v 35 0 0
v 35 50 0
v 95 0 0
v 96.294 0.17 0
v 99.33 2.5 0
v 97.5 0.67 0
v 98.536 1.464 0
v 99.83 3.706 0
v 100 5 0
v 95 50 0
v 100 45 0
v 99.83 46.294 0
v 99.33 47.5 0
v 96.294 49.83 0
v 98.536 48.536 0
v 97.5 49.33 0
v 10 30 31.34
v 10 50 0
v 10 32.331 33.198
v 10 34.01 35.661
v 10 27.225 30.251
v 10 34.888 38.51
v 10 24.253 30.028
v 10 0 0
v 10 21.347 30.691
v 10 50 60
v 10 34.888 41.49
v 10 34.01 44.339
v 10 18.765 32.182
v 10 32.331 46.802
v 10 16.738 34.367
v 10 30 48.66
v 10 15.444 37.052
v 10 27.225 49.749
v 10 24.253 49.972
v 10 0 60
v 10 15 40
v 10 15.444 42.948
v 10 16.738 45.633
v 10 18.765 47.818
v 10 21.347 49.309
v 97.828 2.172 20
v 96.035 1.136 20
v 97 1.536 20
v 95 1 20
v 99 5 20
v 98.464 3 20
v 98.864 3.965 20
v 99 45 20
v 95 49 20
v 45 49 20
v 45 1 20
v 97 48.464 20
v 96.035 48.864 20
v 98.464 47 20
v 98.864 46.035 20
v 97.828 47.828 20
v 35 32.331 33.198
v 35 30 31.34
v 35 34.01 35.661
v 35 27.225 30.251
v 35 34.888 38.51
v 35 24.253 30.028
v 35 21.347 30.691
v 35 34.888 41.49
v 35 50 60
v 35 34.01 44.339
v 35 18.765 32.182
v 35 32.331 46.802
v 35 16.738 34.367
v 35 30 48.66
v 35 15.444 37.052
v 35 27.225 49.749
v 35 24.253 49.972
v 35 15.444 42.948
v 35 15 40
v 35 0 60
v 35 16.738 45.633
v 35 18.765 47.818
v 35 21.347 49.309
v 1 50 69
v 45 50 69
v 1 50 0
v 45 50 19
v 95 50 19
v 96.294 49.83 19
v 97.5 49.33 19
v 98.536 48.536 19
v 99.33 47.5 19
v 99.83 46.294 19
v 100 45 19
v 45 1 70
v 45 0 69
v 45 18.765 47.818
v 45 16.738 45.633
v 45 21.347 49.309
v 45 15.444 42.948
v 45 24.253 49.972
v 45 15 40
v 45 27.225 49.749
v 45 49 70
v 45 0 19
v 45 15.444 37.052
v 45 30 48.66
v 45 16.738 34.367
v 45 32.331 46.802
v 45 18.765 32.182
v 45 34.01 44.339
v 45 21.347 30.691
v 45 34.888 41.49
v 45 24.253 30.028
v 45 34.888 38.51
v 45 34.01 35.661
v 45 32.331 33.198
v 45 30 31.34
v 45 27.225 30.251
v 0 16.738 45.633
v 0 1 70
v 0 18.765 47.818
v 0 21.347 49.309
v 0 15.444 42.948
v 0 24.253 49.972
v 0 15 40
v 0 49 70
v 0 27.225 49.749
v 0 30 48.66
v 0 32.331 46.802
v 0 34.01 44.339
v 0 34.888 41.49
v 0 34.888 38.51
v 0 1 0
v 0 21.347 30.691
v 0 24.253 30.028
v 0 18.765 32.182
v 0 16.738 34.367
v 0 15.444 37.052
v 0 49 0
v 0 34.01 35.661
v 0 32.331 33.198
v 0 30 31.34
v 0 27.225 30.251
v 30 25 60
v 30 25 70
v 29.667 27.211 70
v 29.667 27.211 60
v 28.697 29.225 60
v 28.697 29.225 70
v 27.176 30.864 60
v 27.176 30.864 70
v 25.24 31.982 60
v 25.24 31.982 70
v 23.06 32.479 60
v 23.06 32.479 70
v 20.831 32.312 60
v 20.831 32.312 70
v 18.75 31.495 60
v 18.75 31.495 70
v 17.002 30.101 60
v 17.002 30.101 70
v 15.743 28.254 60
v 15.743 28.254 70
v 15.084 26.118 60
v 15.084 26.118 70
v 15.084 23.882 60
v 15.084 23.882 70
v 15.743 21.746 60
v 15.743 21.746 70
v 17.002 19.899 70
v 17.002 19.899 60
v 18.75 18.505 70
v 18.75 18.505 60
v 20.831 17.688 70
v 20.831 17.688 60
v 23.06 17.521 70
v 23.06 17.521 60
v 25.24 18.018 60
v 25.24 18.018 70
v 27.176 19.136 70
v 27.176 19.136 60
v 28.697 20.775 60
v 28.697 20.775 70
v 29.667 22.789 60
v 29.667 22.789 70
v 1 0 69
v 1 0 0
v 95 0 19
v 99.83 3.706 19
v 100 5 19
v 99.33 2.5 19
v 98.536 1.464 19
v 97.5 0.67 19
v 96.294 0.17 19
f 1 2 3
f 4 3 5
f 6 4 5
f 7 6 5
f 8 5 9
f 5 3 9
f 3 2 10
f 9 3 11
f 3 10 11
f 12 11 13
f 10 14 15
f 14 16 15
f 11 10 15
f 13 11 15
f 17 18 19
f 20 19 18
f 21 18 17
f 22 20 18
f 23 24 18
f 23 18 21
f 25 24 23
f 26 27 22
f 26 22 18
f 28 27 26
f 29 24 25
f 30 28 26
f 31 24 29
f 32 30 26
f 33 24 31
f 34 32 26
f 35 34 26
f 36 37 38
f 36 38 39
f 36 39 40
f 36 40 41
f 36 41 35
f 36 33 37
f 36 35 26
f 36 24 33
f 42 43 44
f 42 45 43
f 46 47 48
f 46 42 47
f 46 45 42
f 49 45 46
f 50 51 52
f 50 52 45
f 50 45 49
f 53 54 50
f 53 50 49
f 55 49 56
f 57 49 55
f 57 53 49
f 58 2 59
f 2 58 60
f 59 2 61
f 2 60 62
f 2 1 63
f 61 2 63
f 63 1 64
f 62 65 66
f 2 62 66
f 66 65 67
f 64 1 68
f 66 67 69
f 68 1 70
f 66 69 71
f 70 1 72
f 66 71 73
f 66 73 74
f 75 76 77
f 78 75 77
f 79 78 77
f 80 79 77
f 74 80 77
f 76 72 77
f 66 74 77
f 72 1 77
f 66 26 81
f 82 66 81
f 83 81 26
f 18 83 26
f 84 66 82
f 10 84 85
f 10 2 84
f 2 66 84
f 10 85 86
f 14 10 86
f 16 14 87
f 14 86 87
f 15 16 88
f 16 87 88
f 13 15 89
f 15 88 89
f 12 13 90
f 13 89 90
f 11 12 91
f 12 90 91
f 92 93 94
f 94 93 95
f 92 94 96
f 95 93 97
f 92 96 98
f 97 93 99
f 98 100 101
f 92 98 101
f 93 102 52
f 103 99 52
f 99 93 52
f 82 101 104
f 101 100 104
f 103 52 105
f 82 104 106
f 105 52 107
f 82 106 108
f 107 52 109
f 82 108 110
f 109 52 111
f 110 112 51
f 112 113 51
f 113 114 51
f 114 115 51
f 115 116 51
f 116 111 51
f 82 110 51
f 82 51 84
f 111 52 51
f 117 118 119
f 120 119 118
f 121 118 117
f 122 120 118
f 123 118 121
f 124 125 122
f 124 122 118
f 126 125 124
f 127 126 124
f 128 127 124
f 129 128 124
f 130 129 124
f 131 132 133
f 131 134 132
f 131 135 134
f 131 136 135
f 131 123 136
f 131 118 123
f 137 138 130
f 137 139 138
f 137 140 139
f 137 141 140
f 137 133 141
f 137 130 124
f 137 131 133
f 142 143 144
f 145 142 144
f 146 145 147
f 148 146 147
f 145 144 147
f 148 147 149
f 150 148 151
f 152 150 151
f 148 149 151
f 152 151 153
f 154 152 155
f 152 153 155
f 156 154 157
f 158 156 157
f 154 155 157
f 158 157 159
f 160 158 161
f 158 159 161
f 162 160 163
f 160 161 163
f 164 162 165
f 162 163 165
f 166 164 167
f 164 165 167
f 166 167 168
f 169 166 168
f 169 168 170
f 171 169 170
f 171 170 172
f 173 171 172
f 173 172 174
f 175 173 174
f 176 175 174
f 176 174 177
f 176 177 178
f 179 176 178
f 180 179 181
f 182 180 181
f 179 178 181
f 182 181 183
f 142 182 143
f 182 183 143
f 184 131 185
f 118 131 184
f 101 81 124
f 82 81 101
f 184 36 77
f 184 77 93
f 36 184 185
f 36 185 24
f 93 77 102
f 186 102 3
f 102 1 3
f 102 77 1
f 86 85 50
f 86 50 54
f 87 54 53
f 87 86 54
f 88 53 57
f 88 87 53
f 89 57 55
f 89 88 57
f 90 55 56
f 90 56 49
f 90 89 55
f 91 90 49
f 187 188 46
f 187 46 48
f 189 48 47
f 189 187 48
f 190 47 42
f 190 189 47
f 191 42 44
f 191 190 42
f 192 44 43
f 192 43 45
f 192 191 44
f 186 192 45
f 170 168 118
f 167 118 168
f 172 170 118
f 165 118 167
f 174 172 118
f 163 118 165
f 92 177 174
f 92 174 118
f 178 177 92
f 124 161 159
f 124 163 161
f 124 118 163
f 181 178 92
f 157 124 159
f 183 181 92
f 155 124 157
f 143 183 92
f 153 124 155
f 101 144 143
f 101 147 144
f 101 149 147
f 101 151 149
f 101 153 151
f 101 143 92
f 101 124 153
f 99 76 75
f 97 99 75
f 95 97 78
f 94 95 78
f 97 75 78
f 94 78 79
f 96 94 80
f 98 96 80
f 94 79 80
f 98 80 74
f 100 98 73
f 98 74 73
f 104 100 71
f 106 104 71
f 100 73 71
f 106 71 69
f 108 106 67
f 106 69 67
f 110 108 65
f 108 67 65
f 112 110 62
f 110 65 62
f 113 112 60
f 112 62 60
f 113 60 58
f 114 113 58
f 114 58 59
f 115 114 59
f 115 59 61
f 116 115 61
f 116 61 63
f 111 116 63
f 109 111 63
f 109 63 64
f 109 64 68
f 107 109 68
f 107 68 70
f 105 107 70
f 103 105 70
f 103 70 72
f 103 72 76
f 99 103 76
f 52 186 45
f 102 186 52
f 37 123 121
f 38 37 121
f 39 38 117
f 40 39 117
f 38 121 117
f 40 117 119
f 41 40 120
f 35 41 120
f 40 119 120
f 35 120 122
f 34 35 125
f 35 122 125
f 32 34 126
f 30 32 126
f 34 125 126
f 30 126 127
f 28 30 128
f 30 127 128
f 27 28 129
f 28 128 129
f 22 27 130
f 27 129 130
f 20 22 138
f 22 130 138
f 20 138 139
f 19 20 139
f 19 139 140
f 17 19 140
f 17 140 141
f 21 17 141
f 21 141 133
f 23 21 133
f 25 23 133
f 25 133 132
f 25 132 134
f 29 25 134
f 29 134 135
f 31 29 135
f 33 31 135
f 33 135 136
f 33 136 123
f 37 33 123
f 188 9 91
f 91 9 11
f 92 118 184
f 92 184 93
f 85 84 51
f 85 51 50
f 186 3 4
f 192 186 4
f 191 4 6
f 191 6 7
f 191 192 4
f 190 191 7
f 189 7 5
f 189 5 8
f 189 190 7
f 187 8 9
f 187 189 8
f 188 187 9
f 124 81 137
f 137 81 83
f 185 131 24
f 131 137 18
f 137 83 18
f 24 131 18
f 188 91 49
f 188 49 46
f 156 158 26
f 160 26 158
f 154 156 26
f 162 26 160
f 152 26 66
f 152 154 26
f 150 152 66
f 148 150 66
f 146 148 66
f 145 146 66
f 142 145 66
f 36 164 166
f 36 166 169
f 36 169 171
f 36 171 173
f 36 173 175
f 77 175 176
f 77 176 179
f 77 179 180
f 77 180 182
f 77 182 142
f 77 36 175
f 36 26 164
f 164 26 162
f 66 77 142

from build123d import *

# Parameters (mm, degrees)
F0_W     = 100
F0_H     = 50
F1_DEPTH = 20
F2_W     = 45
F2_H     = 50
F3_DEPTH = 50
F4_W     = 25
F4_H     = 60
F5_DEPTH = 50.001
F6_R     = 10
F7_DEPTH = 100.001
F8_R     = 7.5
F9_DEPTH = 10
F10_R    = 5
F11_SIZE = 1


with BuildPart() as f1:
    # F0 (on Top) → F1 (new body)
    with BuildSketch(Plane.XY):
        with Locations((50, 25)):
            Rectangle(F0_W, F0_H)
    extrude(amount=F1_DEPTH)

    # F2 (on face) → F3 (join)
    with BuildSketch(Plane.XY.offset(20)):
        with Locations((22.5, 25)):
            Rectangle(F2_W, F2_H)
    extrude(amount=F3_DEPTH)

    # F4 (on face) → F5 (cut, through all)
    with BuildSketch(Plane.XZ):
        with Locations((22.5, 30)):
            Rectangle(F4_W, F4_H)
    extrude(amount=-F5_DEPTH, mode=Mode.SUBTRACT)

    # F6 (on face) → F7 (cut, through all)
    with BuildSketch(Plane(origin=(0, 0, 0), x_dir=(0, -1, 0), z_dir=(-1, 0, 0))):
        with Locations((-25, 40)):
            Circle(F6_R)
    extrude(amount=-F7_DEPTH, mode=Mode.SUBTRACT)

    # F8 (on face) → F9 (cut, through all)
    with BuildSketch(Plane.XY.offset(70)):
        with Locations((22.5, 25)):
            Circle(F8_R)
    extrude(amount=-F9_DEPTH, mode=Mode.SUBTRACT)

    # F10
    f10_edges = [f1.edges().sort_by_distance(p)[0] for p in [
        (100, 0, 10),
        (100, 50, 10),
    ]]
    fillet(f10_edges, radius=F10_R)

    # F11
    f11_edges = [f1.edges().sort_by_distance(p)[0] for p in [
        (0, 0, 35),
        (22.5, 0, 70),
        (0, 50, 35),
        (22.5, 50, 70),
        (70, 50, 20),
        (70, 0, 20),
    ]]
    chamfer(f11_edges, length=F11_SIZE)


solid = f1.part
